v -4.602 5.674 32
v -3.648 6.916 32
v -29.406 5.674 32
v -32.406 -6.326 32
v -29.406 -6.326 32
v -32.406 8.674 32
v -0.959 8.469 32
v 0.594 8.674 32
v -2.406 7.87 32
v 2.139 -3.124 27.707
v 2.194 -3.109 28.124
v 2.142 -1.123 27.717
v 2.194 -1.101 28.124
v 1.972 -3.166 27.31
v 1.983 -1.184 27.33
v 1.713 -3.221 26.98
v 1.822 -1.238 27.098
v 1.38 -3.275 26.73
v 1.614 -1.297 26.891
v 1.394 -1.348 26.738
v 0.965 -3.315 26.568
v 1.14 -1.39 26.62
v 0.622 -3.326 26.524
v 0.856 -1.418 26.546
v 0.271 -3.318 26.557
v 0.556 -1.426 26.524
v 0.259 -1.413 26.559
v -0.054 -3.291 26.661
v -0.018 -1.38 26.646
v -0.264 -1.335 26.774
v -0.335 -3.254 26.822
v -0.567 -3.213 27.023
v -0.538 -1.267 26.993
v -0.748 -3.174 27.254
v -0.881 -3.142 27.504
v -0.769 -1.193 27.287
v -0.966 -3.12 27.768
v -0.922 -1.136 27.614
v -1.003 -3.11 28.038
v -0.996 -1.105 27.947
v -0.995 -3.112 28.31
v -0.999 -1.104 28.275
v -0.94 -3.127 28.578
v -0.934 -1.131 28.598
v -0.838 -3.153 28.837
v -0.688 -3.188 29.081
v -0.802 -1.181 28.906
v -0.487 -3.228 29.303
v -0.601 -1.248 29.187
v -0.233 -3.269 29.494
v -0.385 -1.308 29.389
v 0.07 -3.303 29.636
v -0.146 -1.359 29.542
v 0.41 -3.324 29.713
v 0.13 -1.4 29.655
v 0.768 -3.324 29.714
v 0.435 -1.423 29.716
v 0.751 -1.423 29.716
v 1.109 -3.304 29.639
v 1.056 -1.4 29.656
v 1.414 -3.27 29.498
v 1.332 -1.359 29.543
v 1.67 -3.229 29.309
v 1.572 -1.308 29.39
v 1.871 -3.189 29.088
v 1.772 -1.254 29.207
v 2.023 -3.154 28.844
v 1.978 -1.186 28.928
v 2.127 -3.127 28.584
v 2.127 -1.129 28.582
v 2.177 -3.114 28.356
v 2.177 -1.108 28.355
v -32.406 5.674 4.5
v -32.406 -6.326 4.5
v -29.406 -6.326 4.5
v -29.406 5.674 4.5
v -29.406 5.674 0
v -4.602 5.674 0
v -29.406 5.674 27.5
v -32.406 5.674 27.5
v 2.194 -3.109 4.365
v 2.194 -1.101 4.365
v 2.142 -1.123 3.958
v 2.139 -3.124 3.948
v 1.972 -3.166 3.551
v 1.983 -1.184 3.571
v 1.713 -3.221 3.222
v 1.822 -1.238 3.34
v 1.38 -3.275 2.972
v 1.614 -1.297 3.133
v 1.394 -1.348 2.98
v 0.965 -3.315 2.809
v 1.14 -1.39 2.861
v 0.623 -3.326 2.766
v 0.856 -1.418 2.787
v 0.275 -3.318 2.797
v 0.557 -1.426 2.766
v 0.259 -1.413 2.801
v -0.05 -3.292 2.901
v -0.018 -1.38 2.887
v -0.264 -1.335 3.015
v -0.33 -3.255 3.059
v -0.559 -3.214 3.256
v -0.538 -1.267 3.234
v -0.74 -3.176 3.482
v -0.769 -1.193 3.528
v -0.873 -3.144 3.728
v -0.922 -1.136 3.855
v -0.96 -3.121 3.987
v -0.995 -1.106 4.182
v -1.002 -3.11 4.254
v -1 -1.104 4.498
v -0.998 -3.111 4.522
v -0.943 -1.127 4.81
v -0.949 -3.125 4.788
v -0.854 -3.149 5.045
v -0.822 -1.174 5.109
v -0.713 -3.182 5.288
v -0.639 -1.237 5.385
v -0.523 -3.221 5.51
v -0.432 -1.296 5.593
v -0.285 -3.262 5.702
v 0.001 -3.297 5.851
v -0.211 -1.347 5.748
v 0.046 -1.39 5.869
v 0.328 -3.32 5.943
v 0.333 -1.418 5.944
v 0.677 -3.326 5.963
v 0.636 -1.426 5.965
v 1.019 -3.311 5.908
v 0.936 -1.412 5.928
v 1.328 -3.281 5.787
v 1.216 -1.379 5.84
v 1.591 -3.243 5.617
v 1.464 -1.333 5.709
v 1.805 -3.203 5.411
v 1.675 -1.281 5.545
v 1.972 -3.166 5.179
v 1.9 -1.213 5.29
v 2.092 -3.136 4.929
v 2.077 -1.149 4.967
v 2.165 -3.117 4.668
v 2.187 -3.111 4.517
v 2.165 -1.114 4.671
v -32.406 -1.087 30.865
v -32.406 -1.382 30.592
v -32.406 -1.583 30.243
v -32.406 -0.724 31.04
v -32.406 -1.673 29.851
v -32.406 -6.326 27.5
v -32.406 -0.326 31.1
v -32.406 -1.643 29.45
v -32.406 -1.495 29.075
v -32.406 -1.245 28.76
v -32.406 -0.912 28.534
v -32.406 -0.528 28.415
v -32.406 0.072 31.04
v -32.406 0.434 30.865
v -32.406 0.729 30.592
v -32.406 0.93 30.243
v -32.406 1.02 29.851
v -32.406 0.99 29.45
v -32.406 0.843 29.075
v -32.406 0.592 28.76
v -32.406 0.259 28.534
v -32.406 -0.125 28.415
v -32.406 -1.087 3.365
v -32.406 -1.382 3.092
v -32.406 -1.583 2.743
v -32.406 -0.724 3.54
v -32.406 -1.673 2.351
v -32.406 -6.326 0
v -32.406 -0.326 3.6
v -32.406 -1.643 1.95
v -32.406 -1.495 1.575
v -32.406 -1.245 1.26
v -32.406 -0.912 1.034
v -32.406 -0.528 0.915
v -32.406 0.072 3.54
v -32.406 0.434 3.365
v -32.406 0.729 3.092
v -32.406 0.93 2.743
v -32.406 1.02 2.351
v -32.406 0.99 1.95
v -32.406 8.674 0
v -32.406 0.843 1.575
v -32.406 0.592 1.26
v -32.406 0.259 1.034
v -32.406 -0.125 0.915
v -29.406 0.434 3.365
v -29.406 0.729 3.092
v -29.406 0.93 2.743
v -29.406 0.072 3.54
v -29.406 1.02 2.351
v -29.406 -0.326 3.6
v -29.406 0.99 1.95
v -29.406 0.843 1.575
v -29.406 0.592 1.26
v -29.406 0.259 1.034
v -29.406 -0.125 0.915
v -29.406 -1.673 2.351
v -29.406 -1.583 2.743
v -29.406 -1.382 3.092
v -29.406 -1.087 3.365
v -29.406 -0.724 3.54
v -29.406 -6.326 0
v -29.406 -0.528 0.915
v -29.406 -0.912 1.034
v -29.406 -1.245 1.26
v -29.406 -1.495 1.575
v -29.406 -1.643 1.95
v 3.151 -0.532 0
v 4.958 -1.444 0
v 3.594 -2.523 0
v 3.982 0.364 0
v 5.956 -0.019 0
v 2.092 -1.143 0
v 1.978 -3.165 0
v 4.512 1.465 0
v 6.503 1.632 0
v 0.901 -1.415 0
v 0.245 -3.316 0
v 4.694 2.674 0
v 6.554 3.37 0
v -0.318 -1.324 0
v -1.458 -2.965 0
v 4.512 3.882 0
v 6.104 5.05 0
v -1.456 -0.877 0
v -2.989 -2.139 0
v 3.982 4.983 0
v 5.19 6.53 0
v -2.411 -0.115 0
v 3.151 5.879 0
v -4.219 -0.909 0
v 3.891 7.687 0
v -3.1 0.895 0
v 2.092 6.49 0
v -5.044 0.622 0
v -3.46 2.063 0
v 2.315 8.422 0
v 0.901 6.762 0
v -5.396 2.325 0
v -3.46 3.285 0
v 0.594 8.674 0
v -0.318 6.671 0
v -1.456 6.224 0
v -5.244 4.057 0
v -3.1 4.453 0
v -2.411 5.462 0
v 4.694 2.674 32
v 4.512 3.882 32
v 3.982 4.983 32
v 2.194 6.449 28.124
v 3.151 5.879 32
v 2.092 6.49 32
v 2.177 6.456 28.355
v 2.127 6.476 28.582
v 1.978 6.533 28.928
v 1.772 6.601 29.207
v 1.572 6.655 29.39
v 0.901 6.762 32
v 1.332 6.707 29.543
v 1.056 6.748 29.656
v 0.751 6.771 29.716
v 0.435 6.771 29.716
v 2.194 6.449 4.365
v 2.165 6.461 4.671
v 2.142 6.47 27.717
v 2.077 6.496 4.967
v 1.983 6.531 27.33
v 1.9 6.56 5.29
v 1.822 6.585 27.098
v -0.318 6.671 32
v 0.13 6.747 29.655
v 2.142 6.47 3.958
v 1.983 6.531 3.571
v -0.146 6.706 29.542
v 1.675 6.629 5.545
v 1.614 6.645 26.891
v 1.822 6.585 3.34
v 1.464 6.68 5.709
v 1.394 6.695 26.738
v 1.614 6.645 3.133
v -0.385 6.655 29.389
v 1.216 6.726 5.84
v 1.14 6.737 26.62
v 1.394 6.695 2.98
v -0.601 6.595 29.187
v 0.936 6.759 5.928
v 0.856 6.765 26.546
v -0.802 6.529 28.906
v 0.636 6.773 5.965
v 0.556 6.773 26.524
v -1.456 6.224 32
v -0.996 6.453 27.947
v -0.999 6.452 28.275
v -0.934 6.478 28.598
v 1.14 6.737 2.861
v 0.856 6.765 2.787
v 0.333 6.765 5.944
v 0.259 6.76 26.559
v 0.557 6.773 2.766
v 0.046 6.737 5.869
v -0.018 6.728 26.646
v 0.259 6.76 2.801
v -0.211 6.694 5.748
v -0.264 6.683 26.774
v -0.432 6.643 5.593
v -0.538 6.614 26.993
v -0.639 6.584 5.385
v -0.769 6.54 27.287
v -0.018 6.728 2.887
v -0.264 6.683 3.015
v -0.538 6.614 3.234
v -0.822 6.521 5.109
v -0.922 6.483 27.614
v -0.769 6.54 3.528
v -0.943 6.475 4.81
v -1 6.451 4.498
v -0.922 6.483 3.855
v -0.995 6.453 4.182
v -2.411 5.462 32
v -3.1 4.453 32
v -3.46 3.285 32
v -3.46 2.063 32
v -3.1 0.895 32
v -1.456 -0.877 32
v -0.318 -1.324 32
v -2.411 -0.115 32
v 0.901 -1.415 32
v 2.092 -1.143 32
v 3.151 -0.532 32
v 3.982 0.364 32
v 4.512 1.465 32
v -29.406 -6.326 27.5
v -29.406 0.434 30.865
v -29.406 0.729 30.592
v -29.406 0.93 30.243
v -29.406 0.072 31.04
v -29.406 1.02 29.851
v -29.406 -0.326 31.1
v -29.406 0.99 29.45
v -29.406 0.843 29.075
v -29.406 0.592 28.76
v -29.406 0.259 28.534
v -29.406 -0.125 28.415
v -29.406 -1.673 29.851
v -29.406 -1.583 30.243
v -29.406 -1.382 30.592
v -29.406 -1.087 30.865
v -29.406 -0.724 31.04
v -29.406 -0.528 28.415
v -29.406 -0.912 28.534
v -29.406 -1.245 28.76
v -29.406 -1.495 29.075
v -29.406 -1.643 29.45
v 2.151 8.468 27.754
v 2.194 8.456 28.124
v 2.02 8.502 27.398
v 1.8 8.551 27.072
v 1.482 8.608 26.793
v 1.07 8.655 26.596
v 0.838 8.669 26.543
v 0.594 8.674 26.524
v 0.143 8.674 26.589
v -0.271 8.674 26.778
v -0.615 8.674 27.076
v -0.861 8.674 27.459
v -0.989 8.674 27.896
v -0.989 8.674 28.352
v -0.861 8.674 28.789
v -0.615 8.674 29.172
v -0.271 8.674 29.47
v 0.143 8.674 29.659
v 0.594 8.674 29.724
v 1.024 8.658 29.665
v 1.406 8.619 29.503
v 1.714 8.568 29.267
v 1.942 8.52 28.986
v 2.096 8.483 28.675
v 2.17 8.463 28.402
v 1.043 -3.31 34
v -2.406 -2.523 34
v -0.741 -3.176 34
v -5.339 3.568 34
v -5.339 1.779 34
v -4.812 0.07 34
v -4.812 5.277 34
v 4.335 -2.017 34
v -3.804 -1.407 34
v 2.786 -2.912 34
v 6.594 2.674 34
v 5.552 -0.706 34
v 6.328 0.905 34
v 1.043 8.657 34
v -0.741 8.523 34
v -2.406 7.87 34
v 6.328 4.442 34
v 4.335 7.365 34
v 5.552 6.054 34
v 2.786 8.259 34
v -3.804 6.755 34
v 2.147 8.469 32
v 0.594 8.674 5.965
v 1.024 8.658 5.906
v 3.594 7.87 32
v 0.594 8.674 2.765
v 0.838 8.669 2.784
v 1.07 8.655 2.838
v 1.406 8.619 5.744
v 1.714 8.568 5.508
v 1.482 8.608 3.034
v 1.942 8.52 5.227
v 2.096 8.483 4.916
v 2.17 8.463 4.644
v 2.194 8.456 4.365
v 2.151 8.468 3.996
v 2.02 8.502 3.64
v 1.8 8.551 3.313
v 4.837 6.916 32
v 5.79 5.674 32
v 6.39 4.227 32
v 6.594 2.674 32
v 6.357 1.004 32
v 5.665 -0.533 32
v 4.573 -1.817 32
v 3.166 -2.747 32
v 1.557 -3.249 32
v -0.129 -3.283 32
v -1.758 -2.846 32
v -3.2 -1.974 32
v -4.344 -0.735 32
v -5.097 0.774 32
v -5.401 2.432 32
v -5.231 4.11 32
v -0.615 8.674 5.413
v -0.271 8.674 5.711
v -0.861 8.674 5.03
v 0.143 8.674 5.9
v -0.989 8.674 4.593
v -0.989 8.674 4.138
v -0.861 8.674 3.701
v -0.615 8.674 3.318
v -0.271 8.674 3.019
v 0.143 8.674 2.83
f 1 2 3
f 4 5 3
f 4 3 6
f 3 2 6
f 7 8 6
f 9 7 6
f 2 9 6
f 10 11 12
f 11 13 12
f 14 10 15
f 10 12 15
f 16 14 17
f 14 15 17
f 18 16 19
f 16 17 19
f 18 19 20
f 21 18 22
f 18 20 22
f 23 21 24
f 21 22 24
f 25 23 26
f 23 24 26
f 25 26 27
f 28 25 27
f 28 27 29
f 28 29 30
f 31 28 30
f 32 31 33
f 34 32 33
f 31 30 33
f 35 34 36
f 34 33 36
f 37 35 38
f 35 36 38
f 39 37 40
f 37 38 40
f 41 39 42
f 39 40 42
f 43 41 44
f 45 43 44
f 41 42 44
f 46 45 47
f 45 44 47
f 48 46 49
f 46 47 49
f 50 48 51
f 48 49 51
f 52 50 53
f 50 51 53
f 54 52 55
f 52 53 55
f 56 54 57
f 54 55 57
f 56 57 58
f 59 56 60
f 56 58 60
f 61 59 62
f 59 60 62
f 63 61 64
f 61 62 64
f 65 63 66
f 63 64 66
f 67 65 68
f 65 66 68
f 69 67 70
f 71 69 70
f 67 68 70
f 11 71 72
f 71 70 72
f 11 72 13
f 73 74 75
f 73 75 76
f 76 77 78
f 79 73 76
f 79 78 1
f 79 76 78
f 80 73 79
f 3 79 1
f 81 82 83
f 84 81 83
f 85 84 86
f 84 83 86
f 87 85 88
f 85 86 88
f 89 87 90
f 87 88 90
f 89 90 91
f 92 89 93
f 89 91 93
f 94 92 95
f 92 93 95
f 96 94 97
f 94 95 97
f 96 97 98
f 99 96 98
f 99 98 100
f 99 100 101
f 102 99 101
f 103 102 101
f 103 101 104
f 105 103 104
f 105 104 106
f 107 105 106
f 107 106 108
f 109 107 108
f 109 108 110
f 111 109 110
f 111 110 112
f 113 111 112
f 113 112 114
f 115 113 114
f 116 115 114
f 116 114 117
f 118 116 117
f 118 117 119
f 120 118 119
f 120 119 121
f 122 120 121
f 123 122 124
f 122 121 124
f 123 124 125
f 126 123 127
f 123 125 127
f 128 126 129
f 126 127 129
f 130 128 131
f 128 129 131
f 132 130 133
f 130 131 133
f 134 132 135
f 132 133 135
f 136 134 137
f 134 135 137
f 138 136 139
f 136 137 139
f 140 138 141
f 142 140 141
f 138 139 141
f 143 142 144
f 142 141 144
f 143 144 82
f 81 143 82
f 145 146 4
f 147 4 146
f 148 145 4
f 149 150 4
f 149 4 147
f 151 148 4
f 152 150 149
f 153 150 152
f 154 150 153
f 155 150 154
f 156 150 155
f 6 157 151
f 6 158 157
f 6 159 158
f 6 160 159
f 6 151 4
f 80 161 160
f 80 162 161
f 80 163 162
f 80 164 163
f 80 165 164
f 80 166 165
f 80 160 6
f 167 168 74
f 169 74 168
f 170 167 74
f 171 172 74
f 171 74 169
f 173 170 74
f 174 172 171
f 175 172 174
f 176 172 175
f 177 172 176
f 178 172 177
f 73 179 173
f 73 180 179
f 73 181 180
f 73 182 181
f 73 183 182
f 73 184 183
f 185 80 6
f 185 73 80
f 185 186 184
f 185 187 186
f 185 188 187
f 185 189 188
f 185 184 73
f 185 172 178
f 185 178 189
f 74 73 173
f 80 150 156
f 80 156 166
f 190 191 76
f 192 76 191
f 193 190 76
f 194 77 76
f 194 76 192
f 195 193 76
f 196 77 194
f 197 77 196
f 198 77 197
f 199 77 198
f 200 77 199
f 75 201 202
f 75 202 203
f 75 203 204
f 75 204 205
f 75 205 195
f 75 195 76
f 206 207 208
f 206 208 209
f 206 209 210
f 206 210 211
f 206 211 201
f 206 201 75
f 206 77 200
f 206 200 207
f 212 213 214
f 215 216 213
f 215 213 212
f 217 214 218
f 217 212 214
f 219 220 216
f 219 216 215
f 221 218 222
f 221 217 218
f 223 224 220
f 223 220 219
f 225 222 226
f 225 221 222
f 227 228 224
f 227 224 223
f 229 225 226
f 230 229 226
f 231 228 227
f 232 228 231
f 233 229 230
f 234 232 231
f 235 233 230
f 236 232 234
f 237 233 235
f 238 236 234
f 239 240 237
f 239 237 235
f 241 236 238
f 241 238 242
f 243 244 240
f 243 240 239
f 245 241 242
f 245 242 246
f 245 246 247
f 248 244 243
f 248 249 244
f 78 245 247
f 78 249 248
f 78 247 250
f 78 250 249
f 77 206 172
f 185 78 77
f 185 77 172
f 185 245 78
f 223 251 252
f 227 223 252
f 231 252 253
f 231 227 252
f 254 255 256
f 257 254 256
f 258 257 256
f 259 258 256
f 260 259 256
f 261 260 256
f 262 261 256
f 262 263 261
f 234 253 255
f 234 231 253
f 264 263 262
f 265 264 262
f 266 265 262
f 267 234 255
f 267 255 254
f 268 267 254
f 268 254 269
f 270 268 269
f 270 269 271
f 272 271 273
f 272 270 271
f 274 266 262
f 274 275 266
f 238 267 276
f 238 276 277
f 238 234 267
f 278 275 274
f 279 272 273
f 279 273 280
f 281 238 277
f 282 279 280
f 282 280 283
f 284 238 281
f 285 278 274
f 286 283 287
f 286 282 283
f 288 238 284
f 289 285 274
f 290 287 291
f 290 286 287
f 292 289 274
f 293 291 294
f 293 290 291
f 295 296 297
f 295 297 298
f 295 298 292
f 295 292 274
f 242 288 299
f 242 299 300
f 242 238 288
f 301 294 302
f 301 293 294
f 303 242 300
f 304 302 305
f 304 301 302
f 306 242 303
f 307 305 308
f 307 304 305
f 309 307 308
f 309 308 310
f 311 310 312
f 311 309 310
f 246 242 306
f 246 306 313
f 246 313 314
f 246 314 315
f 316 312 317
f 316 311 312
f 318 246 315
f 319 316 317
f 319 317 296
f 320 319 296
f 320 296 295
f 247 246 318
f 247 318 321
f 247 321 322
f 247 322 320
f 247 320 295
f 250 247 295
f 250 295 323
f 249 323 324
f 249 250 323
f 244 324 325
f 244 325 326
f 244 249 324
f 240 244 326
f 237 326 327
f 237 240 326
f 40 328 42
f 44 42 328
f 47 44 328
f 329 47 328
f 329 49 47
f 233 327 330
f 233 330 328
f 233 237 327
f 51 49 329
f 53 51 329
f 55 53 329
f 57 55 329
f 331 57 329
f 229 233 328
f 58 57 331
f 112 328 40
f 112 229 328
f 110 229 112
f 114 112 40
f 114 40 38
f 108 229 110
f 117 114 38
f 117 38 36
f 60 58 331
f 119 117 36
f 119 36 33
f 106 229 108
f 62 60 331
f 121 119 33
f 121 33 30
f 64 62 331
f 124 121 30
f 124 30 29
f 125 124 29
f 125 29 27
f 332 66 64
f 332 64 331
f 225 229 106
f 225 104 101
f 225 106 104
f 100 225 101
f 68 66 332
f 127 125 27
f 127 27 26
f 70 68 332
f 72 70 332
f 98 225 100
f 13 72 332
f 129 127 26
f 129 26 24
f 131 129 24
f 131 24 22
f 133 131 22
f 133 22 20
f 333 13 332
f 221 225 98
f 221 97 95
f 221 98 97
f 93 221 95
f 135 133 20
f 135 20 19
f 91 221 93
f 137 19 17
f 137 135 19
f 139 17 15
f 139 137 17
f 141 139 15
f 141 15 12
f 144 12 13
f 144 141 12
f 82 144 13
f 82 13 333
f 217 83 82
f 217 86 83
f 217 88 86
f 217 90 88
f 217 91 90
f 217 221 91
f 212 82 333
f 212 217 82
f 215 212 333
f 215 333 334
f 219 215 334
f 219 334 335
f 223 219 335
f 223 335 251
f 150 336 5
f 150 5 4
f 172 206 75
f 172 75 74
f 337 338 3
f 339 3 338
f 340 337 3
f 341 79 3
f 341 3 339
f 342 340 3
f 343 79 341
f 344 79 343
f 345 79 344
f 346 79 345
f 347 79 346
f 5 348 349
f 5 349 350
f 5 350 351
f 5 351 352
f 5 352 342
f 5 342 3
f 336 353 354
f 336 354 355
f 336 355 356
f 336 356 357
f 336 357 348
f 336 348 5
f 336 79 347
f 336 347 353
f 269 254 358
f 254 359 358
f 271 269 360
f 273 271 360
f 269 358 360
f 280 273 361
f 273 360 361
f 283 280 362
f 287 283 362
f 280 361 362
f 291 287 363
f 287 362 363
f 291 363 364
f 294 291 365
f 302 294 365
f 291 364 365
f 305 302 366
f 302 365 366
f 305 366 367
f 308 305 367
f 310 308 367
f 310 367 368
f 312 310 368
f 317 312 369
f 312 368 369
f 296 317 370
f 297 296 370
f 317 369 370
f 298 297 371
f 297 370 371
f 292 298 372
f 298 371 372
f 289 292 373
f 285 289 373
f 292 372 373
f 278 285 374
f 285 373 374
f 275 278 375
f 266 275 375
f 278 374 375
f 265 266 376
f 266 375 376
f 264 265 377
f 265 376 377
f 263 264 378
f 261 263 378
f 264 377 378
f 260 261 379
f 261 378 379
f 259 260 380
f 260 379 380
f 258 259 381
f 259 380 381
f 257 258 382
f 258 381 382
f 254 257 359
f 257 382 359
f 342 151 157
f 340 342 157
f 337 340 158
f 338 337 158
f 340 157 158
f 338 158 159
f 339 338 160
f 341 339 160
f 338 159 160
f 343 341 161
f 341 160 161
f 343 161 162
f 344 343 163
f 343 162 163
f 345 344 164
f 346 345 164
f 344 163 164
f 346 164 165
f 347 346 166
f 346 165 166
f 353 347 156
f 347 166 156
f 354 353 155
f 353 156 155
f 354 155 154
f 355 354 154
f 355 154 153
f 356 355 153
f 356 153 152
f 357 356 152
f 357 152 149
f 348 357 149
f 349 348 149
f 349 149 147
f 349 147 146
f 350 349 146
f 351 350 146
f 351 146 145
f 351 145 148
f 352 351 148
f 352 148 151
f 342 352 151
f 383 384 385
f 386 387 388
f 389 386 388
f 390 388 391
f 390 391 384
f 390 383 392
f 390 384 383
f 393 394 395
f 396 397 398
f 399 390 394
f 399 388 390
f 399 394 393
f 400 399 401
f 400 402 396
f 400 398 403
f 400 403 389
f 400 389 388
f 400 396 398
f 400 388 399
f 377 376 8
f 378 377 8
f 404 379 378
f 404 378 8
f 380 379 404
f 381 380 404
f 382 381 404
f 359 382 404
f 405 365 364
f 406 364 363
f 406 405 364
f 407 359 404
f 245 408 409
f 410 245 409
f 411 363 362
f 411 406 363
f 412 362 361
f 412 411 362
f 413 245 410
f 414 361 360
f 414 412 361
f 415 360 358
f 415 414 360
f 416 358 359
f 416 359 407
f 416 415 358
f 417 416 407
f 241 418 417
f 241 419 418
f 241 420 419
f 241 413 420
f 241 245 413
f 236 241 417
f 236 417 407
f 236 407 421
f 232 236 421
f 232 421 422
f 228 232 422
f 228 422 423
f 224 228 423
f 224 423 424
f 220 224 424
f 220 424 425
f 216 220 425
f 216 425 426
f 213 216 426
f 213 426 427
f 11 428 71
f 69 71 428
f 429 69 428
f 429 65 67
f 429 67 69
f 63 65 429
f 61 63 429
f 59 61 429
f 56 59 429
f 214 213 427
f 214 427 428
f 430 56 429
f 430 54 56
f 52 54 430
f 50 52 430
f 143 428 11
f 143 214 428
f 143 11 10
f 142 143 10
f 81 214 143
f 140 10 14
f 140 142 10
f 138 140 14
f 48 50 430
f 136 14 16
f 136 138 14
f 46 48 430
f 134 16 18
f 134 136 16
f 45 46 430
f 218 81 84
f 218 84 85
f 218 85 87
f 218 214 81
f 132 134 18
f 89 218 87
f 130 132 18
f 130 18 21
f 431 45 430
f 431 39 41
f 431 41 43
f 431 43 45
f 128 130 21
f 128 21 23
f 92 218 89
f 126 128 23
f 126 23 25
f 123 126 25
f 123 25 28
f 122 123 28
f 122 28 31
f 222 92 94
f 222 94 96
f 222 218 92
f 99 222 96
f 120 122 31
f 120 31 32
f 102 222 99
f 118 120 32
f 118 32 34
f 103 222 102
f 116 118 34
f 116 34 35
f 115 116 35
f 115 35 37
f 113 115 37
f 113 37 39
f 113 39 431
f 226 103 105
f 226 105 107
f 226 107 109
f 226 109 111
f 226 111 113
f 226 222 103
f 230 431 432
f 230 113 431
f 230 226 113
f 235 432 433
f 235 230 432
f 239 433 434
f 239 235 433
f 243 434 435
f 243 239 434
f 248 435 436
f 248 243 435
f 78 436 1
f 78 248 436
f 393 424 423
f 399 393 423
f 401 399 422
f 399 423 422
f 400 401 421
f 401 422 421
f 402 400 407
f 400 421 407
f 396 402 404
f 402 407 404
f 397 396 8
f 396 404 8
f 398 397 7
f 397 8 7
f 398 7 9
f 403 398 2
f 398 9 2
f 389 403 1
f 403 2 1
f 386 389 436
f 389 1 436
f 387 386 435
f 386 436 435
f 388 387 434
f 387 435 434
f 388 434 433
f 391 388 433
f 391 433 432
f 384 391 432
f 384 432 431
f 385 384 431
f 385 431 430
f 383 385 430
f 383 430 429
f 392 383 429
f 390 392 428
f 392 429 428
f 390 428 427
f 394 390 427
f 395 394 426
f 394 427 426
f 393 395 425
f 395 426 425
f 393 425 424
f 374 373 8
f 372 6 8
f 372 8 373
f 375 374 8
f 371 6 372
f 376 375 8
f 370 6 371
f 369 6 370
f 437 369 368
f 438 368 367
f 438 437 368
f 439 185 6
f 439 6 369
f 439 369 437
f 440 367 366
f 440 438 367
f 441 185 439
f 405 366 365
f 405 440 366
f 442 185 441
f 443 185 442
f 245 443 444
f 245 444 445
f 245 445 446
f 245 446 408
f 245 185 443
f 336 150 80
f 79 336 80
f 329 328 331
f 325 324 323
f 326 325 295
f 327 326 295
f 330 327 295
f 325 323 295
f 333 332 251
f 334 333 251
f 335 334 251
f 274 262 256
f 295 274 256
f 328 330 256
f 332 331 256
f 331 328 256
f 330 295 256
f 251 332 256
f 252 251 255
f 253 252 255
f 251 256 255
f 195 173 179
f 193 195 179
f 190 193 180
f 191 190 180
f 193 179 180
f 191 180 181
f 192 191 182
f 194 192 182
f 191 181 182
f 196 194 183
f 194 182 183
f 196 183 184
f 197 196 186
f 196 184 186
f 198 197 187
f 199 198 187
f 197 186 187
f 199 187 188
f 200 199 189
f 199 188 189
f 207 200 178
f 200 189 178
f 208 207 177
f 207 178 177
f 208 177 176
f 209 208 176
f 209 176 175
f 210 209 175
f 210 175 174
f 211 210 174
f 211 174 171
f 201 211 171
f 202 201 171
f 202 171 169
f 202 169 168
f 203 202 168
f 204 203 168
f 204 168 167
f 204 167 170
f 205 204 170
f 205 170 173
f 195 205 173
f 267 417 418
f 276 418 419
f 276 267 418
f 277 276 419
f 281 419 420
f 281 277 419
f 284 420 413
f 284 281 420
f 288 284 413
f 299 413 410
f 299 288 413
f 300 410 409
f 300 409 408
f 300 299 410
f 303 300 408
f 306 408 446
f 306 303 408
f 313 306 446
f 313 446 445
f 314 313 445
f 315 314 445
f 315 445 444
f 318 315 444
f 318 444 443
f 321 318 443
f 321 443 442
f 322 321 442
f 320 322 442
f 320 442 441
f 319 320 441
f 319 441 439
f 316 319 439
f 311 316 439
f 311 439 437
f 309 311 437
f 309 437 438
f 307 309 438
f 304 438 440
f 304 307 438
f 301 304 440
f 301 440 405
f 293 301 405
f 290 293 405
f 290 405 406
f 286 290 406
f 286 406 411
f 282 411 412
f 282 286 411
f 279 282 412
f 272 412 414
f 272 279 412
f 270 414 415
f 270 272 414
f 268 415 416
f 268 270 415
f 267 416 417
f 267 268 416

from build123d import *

# Parameters (mm, degrees)
SKETCH_1_R          = 4.1
EXTRUDE_1_DEPTH     = 32
SKETCH_3_R          = 1.35
SKETCH_3_W          = 23
SKETCH_3_H          = 12
CUT_EXTRUDE_1_DEPTH = 5
SKETCH_4_R          = 1.6
CUT_EXTRUDE_2_DEPTH = 10
SKETCH_5_R          = 6
EXTRUDE_2_DEPTH     = 2


with BuildPart() as part:
    # 草图1 → 凸台-拉伸1 (new body)
    with BuildSketch(Plane.XY):
        with BuildLine():
            Line((-32.405771928, 8.673637409), (-5.405771928, 8.673637409))
            Line((-5.405771928, 8.673637409), (0.594228072, 8.673637409))
            ThreePointArc((0.594228072, 8.673637409), (3.594228072, -2.522515014), (-4.601924351, 5.673637409))
            Line((-4.601924351, 5.673637409), (-29.405771928, 5.673637409))
            Line((-29.405771928, 5.673637409), (-29.405771928, -6.326362591))
            Line((-29.405771928, -6.326362591), (-32.405771928, -6.326362591))
            Line((-32.405771928, -6.326362591), (-32.405771928, 5.673637409))
            Line((-32.405771928, 5.673637409), (-32.405771928, 8.673637409))
        make_face()
        with Locations((0.594228072, 2.673637409)):
            Circle(SKETCH_1_R, mode=Mode.SUBTRACT)
    extrude(amount=EXTRUDE_1_DEPTH)

    # 草图3 → 切除-拉伸1 (cut)
    with BuildSketch(Plane.ZY.offset(32.405771928)):
        with Locations((29.75, -0.326362591)):
            Circle(SKETCH_3_R)
        with Locations((2.25, -0.326362591)):
            Circle(SKETCH_3_R)
        with Locations((16, -0.326362591)):
            Rectangle(SKETCH_3_W, SKETCH_3_H)
    extrude(amount=-CUT_EXTRUDE_1_DEPTH, mode=Mode.SUBTRACT)

    # 草图4 → 切除-拉伸2 (cut, symmetric)
    with BuildSketch(Plane(origin=(0, 0, 0), x_dir=(1, 0, 0), z_dir=(0, 1, 0))):
        with Locations((0.594228072, -4.365303353)):
            Circle(SKETCH_4_R)
        with Locations((0.594228072, -28.123934877)):
            Circle(SKETCH_4_R)
    extrude(amount=CUT_EXTRUDE_2_DEPTH, both=True, mode=Mode.SUBTRACT)

    # 草图5 → 凸台-拉伸2 (add)
    with BuildSketch(Plane.XY.offset(32)):
        with Locations((0.594228072, 2.673637409)):
            Circle(SKETCH_5_R)
    extrude(amount=EXTRUDE_2_DEPTH)


solid = part.part
